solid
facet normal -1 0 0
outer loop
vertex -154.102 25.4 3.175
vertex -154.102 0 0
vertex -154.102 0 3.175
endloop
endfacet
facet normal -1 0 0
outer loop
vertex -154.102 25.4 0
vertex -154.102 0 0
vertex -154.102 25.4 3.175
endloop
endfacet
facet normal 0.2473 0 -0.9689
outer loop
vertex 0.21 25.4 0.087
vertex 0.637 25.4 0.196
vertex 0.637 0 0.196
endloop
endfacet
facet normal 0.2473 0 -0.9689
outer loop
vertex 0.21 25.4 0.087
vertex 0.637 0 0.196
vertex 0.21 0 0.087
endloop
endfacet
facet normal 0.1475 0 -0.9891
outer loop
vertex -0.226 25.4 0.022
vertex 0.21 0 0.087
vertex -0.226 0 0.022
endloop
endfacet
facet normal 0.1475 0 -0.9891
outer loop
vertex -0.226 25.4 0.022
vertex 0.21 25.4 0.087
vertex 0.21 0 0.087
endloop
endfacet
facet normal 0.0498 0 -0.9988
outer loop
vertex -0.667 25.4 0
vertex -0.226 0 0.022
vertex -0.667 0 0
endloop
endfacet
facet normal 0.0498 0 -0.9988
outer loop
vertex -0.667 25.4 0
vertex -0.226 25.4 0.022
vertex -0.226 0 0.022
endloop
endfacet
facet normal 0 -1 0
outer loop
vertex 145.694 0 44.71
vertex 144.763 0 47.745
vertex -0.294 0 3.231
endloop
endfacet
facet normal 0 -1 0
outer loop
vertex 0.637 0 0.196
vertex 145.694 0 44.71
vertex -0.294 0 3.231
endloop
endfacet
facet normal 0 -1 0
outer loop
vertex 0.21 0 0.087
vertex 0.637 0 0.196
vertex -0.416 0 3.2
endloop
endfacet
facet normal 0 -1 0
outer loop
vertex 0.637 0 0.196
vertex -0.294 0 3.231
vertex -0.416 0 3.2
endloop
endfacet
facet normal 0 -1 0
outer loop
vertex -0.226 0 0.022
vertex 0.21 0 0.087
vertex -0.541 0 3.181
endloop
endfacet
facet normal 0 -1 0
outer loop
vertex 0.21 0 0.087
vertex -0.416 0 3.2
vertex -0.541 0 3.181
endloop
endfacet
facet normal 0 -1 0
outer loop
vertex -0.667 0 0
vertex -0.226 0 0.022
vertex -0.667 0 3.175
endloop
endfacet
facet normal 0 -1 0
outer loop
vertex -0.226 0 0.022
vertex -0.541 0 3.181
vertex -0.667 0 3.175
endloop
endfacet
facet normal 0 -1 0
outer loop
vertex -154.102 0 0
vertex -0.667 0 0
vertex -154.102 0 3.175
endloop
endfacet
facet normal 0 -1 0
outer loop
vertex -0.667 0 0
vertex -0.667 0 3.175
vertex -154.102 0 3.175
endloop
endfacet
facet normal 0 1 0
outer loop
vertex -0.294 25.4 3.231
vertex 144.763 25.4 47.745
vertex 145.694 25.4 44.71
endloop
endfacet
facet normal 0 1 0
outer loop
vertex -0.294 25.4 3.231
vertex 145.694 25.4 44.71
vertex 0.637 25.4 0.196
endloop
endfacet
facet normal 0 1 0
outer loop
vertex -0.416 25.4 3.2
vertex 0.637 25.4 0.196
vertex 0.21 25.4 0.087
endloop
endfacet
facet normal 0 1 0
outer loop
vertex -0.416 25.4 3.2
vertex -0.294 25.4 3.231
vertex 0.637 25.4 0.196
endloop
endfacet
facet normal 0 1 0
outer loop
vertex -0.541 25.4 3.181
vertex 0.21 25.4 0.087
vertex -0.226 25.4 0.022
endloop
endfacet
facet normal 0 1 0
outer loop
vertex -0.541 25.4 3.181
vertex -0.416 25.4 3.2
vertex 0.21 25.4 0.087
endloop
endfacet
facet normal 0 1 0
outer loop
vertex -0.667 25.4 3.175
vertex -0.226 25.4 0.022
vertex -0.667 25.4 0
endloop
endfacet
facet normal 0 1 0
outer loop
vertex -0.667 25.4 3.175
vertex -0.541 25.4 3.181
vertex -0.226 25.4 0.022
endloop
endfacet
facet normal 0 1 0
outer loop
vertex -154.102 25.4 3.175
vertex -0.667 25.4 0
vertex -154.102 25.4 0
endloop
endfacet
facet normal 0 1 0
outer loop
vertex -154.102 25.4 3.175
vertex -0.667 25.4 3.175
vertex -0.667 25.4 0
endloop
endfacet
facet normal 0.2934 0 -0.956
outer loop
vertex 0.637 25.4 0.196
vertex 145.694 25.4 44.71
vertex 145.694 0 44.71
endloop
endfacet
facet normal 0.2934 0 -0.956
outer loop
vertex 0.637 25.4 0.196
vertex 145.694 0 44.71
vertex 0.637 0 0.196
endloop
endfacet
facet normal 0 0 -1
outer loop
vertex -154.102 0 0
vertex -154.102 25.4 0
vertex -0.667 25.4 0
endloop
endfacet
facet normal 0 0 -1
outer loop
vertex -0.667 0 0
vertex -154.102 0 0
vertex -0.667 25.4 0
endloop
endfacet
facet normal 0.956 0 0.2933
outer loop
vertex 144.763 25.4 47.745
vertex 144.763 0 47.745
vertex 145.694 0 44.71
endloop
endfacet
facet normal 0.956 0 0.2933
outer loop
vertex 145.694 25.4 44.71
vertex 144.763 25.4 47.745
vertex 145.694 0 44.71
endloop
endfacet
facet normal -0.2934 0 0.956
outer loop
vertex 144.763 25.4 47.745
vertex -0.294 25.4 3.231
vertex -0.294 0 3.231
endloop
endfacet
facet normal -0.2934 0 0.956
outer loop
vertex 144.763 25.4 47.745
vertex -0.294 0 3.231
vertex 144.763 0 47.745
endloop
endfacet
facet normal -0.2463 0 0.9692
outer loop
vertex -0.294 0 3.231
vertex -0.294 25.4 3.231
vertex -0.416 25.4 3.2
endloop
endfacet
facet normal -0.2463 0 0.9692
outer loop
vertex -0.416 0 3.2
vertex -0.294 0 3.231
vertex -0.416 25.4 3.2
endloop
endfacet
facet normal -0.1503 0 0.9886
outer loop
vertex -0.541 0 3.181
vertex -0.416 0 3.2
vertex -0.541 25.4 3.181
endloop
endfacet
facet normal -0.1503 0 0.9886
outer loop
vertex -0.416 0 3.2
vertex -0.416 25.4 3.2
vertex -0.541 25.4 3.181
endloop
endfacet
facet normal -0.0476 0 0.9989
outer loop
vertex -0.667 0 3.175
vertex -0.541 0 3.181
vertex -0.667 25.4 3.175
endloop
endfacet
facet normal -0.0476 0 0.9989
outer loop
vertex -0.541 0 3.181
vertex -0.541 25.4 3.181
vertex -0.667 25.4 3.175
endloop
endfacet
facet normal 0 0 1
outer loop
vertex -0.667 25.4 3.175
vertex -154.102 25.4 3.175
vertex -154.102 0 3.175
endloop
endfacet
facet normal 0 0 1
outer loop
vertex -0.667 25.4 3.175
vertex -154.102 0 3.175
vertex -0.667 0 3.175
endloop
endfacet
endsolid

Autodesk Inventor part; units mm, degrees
ref_plane "YZ Plane" through (0, 0, 0) normal (1, 0, 0) x (0, 1, 0)
ref_plane "XZ Plane" through (0, 0, 0) normal (0, 1, 0) x (-1, 0, 0)
ref_plane "XY Plane" through (0, 0, 0) normal (0, 0, 1) x (1, 0, 0)
sketch "Sketch1" plane through (0, 0, 0) normal (0, 0, 1) x (1, 0, 0)
  line L0 (0, 0) -> (-154.1018, 0)
  line L1 (-154.1018, 0) -> (-154.1018, 25.4)
  line L2 (-154.1018, 25.4) -> (0, 25.4)
  line L3 (0, 25.4) -> (0, 0)
  dimension "d0" = 154.1018
  dimension "d1" = 25.4
extrude "Plate1" add sketch "Sketch1" along normal blind 3.175
sketch "Sketch2" plane through (0, 0, 3.175) normal (0, 0, 1) x (1, 0, 0)
  line L0 (-154.1018, 0) -> (-154.1018, 25.4) projected
  line L1 (0, 0) -> (-154.1018, 0) projected
  line L2 (0, 25.4) -> (0, 0) projected
  line L3 (-154.1018, 25.4) -> (0, 25.4) projected
  line L4 (-154.1018, 25.4) -> (-1.7018, 25.4)
  line L5 (-1.7018, 25.4) -> (-77.0509, 0)
  dimension "d3" = 152.4
sketch "Sketch3" plane through (-0.9315, 25.4, 3.0353) normal (0.293373, 0, -0.9559981) x (0, 1, 0)
  line L0 (-25.4, 0) -> (0, 0)
  line L1 (0, 0) -> (0, 152.4)
  line L2 (0, 152.4) -> (-25.4, 152.4)
  line L3 (-25.4, 152.4) -> (-25.4, 0)
edge flange "Flange1" height 152.4 angle 17.06 thickness 3.175 bend radius 1.27 thickness toward (0.293373, 0, -0.9559981) relief straight relief width 3.175 relief depth 1.5875 edges at (0, 12.7, 3.175) wall of the first edge with corners at (-0.9315, 0, 3.0353) (-0.9315, 25.4, 3.0353) (144.7626, 25.4, 47.7453) (144.7626, 0, 47.7453)
bend "Bend1"
corner "Corner1"
equation "\"d4\" = BendReliefWidth"
equation "\"d5\" = BendReliefDepth"
equation "\"d6\" = MinimumRemnant"
equation "\"d7\" = BendRadius"
equation "\"d11\" = CornerReliefSize"
equation "\"d12\" = GapSize"
equation "\"d13\" = JacobiRadiusSize"
equation "\"BendRadius\" = Thickness"
equation "\"BendReliefWidth\" = Thickness"
equation "\"BendReliefDepth\" = 0.5 * Thickness"
equation "\"CornerReliefSize\" = 4 * Thickness"
equation "\"MinimumRemnant\" = 2 * Thickness"
equation "\"TransitionRadius\" = BendRadius"
equation "\"JacobiRadiusSize\" = Thickness"
equation "\"GapSize\" = Thickness"
equation "\"d2\" = BendRadius"
equation "\"Thickness\" = 3.175"
properties part number "bent plough"
